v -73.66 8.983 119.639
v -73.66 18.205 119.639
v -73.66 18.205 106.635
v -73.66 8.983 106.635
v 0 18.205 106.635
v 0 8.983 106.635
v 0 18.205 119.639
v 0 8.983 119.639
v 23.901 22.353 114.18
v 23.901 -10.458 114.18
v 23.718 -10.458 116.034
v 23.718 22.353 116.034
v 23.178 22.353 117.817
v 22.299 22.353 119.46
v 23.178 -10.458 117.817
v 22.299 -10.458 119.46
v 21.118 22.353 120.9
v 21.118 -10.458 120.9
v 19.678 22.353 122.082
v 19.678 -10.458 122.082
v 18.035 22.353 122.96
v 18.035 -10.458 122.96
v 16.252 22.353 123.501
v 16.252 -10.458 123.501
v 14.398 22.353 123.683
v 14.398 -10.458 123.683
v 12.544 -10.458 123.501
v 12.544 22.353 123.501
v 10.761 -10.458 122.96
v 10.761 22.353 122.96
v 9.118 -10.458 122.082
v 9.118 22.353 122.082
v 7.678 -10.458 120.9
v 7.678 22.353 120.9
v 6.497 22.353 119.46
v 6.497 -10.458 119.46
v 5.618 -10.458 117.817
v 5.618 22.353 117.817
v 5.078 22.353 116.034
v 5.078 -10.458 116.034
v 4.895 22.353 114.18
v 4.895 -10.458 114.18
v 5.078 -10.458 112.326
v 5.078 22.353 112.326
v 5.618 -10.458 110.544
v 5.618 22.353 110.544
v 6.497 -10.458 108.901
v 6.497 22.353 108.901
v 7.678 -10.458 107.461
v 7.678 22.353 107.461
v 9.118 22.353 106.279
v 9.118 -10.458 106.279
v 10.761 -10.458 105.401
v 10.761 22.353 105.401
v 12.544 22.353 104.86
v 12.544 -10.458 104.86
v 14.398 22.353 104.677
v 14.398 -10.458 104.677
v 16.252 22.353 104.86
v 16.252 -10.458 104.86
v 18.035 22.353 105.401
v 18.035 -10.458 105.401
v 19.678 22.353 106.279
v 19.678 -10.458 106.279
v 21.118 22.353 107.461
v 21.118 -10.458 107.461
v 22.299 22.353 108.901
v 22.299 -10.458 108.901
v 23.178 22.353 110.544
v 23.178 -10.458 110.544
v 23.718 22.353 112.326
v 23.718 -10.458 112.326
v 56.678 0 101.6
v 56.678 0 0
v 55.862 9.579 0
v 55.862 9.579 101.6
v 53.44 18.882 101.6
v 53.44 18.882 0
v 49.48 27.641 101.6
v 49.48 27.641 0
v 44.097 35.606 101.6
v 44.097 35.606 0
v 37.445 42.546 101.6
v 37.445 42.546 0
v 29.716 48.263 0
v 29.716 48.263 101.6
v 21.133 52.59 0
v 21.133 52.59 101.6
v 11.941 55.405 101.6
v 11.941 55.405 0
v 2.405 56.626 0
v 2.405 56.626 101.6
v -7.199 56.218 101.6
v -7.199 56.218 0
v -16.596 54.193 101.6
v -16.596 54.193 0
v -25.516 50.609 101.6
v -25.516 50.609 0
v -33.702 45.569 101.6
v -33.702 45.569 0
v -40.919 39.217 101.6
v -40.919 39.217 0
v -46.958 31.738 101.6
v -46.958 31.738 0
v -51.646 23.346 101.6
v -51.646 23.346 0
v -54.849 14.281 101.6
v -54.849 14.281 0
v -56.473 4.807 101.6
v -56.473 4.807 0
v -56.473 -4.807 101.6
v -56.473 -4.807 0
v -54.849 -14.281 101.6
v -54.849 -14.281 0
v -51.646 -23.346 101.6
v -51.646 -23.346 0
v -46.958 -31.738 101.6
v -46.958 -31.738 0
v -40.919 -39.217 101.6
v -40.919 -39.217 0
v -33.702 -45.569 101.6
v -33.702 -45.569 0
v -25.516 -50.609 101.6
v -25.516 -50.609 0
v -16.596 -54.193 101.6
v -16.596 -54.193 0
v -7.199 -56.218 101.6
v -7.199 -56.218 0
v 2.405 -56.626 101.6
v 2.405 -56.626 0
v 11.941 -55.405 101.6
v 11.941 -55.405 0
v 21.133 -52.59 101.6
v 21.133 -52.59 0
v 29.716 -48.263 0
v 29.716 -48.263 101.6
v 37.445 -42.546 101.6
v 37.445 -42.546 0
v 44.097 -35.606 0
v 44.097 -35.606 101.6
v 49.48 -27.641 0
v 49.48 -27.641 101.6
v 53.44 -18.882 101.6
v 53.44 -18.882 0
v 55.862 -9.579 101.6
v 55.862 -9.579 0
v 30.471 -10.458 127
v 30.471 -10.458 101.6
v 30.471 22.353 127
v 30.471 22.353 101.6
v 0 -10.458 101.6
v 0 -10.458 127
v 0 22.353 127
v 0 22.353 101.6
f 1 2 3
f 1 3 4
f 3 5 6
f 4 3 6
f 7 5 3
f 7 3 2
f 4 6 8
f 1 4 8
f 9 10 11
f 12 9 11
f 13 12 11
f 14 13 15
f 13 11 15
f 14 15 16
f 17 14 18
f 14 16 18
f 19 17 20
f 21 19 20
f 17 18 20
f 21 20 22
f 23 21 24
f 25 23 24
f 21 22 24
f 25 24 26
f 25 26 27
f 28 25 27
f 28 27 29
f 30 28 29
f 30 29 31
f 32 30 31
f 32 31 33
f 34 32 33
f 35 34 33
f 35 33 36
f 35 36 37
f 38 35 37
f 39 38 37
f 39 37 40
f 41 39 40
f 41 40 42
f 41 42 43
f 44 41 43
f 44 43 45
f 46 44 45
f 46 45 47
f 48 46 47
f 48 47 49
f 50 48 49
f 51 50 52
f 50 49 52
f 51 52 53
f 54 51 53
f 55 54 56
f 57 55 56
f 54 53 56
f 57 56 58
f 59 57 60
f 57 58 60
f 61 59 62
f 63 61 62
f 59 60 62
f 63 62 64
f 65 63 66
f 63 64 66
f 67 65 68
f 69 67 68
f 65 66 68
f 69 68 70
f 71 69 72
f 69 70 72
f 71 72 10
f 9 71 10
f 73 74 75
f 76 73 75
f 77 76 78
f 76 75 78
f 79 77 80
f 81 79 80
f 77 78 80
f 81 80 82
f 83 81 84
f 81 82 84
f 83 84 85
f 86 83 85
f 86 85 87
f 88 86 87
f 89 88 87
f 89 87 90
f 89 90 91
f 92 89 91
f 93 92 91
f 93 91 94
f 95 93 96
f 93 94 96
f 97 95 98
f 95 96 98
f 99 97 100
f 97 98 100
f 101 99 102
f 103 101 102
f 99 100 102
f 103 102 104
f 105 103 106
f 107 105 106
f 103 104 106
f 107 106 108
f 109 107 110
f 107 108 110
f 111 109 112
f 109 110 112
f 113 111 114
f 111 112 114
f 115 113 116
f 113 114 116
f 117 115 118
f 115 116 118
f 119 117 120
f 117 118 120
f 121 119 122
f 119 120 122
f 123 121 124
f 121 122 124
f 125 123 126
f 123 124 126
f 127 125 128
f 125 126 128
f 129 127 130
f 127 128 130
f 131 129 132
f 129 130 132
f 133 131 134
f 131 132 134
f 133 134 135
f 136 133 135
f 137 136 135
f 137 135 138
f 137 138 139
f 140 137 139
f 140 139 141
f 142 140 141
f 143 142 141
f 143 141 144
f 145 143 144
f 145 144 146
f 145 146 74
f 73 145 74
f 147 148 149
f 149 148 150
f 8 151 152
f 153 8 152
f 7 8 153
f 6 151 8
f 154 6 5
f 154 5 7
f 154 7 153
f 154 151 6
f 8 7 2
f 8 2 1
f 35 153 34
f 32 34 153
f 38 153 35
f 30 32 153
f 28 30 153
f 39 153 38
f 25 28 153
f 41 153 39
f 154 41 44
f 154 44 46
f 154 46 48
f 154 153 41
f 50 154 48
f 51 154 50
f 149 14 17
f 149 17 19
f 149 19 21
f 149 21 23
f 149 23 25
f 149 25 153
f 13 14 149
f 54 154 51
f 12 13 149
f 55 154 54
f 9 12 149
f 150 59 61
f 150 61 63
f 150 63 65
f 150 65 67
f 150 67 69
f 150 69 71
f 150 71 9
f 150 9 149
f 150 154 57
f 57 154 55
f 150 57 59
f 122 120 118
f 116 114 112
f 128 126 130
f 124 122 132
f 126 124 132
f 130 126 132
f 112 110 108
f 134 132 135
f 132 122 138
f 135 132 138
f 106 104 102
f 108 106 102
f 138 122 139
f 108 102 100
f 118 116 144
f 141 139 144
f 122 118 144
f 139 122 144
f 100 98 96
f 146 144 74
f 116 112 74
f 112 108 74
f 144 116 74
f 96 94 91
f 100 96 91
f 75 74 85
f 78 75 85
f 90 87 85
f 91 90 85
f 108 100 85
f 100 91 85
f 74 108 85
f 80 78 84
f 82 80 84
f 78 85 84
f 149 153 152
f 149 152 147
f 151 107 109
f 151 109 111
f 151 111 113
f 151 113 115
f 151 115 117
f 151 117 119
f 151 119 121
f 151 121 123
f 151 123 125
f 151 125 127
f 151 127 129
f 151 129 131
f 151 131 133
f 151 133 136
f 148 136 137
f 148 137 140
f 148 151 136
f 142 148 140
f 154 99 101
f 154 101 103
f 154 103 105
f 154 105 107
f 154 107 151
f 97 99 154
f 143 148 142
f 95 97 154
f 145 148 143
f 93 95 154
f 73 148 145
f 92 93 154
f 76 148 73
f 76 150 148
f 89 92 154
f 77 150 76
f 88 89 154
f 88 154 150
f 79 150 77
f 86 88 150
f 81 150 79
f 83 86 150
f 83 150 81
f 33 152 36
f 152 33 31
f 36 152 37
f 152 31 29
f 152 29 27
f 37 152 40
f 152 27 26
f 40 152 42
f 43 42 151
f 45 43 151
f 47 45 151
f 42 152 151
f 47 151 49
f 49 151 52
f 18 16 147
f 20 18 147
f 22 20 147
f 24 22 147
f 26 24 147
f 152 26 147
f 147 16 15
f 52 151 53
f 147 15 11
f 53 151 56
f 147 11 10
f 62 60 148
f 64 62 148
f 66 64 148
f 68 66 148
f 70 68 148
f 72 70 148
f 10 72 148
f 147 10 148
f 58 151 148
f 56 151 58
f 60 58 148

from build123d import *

# Parameters (mm, degrees)
F0_R     = 56.6775015073
F1_DEPTH = 101.6
F2_W     = 30.4712727666
F2_H     = 32.811390236
F3_DEPTH = 25.4
F4_W     = 9.221942164
F4_H     = 13.0037814379
F5_DEPTH = 73.66
F6_R     = 9.5030077165
F7_DEPTH = 50.8


with BuildPart() as f1:
    # F0 (on Top) → F1 (new body)
    with BuildSketch(Plane.XY):
        Circle(F0_R)
    extrude(amount=F1_DEPTH)

    # F2 (on face) → F3 (join)
    with BuildSketch(Plane.XY.offset(101.6)):
        with Locations((15.2356363833, 5.9477584437)):
            Rectangle(F2_W, F2_H)
    extrude(amount=F3_DEPTH)

    # F4 (on face) → F5 (join)
    with BuildSketch(Plane(origin=(0, 0, 0), x_dir=(0, -1, 0), z_dir=(-1, 0, 0))):
        with Locations((-13.5935484432, 113.1370440125)):
            Rectangle(F4_W, F4_H)
    extrude(amount=F5_DEPTH)

    # F6 (on face) → F7 (cut)
    with BuildSketch(Plane.XZ.offset(10.4579366744)):
        with Locations((14.3979880959, 114.1804158688)):
            Circle(F6_R)
    extrude(amount=-F7_DEPTH, mode=Mode.SUBTRACT)


solid = f1.part
